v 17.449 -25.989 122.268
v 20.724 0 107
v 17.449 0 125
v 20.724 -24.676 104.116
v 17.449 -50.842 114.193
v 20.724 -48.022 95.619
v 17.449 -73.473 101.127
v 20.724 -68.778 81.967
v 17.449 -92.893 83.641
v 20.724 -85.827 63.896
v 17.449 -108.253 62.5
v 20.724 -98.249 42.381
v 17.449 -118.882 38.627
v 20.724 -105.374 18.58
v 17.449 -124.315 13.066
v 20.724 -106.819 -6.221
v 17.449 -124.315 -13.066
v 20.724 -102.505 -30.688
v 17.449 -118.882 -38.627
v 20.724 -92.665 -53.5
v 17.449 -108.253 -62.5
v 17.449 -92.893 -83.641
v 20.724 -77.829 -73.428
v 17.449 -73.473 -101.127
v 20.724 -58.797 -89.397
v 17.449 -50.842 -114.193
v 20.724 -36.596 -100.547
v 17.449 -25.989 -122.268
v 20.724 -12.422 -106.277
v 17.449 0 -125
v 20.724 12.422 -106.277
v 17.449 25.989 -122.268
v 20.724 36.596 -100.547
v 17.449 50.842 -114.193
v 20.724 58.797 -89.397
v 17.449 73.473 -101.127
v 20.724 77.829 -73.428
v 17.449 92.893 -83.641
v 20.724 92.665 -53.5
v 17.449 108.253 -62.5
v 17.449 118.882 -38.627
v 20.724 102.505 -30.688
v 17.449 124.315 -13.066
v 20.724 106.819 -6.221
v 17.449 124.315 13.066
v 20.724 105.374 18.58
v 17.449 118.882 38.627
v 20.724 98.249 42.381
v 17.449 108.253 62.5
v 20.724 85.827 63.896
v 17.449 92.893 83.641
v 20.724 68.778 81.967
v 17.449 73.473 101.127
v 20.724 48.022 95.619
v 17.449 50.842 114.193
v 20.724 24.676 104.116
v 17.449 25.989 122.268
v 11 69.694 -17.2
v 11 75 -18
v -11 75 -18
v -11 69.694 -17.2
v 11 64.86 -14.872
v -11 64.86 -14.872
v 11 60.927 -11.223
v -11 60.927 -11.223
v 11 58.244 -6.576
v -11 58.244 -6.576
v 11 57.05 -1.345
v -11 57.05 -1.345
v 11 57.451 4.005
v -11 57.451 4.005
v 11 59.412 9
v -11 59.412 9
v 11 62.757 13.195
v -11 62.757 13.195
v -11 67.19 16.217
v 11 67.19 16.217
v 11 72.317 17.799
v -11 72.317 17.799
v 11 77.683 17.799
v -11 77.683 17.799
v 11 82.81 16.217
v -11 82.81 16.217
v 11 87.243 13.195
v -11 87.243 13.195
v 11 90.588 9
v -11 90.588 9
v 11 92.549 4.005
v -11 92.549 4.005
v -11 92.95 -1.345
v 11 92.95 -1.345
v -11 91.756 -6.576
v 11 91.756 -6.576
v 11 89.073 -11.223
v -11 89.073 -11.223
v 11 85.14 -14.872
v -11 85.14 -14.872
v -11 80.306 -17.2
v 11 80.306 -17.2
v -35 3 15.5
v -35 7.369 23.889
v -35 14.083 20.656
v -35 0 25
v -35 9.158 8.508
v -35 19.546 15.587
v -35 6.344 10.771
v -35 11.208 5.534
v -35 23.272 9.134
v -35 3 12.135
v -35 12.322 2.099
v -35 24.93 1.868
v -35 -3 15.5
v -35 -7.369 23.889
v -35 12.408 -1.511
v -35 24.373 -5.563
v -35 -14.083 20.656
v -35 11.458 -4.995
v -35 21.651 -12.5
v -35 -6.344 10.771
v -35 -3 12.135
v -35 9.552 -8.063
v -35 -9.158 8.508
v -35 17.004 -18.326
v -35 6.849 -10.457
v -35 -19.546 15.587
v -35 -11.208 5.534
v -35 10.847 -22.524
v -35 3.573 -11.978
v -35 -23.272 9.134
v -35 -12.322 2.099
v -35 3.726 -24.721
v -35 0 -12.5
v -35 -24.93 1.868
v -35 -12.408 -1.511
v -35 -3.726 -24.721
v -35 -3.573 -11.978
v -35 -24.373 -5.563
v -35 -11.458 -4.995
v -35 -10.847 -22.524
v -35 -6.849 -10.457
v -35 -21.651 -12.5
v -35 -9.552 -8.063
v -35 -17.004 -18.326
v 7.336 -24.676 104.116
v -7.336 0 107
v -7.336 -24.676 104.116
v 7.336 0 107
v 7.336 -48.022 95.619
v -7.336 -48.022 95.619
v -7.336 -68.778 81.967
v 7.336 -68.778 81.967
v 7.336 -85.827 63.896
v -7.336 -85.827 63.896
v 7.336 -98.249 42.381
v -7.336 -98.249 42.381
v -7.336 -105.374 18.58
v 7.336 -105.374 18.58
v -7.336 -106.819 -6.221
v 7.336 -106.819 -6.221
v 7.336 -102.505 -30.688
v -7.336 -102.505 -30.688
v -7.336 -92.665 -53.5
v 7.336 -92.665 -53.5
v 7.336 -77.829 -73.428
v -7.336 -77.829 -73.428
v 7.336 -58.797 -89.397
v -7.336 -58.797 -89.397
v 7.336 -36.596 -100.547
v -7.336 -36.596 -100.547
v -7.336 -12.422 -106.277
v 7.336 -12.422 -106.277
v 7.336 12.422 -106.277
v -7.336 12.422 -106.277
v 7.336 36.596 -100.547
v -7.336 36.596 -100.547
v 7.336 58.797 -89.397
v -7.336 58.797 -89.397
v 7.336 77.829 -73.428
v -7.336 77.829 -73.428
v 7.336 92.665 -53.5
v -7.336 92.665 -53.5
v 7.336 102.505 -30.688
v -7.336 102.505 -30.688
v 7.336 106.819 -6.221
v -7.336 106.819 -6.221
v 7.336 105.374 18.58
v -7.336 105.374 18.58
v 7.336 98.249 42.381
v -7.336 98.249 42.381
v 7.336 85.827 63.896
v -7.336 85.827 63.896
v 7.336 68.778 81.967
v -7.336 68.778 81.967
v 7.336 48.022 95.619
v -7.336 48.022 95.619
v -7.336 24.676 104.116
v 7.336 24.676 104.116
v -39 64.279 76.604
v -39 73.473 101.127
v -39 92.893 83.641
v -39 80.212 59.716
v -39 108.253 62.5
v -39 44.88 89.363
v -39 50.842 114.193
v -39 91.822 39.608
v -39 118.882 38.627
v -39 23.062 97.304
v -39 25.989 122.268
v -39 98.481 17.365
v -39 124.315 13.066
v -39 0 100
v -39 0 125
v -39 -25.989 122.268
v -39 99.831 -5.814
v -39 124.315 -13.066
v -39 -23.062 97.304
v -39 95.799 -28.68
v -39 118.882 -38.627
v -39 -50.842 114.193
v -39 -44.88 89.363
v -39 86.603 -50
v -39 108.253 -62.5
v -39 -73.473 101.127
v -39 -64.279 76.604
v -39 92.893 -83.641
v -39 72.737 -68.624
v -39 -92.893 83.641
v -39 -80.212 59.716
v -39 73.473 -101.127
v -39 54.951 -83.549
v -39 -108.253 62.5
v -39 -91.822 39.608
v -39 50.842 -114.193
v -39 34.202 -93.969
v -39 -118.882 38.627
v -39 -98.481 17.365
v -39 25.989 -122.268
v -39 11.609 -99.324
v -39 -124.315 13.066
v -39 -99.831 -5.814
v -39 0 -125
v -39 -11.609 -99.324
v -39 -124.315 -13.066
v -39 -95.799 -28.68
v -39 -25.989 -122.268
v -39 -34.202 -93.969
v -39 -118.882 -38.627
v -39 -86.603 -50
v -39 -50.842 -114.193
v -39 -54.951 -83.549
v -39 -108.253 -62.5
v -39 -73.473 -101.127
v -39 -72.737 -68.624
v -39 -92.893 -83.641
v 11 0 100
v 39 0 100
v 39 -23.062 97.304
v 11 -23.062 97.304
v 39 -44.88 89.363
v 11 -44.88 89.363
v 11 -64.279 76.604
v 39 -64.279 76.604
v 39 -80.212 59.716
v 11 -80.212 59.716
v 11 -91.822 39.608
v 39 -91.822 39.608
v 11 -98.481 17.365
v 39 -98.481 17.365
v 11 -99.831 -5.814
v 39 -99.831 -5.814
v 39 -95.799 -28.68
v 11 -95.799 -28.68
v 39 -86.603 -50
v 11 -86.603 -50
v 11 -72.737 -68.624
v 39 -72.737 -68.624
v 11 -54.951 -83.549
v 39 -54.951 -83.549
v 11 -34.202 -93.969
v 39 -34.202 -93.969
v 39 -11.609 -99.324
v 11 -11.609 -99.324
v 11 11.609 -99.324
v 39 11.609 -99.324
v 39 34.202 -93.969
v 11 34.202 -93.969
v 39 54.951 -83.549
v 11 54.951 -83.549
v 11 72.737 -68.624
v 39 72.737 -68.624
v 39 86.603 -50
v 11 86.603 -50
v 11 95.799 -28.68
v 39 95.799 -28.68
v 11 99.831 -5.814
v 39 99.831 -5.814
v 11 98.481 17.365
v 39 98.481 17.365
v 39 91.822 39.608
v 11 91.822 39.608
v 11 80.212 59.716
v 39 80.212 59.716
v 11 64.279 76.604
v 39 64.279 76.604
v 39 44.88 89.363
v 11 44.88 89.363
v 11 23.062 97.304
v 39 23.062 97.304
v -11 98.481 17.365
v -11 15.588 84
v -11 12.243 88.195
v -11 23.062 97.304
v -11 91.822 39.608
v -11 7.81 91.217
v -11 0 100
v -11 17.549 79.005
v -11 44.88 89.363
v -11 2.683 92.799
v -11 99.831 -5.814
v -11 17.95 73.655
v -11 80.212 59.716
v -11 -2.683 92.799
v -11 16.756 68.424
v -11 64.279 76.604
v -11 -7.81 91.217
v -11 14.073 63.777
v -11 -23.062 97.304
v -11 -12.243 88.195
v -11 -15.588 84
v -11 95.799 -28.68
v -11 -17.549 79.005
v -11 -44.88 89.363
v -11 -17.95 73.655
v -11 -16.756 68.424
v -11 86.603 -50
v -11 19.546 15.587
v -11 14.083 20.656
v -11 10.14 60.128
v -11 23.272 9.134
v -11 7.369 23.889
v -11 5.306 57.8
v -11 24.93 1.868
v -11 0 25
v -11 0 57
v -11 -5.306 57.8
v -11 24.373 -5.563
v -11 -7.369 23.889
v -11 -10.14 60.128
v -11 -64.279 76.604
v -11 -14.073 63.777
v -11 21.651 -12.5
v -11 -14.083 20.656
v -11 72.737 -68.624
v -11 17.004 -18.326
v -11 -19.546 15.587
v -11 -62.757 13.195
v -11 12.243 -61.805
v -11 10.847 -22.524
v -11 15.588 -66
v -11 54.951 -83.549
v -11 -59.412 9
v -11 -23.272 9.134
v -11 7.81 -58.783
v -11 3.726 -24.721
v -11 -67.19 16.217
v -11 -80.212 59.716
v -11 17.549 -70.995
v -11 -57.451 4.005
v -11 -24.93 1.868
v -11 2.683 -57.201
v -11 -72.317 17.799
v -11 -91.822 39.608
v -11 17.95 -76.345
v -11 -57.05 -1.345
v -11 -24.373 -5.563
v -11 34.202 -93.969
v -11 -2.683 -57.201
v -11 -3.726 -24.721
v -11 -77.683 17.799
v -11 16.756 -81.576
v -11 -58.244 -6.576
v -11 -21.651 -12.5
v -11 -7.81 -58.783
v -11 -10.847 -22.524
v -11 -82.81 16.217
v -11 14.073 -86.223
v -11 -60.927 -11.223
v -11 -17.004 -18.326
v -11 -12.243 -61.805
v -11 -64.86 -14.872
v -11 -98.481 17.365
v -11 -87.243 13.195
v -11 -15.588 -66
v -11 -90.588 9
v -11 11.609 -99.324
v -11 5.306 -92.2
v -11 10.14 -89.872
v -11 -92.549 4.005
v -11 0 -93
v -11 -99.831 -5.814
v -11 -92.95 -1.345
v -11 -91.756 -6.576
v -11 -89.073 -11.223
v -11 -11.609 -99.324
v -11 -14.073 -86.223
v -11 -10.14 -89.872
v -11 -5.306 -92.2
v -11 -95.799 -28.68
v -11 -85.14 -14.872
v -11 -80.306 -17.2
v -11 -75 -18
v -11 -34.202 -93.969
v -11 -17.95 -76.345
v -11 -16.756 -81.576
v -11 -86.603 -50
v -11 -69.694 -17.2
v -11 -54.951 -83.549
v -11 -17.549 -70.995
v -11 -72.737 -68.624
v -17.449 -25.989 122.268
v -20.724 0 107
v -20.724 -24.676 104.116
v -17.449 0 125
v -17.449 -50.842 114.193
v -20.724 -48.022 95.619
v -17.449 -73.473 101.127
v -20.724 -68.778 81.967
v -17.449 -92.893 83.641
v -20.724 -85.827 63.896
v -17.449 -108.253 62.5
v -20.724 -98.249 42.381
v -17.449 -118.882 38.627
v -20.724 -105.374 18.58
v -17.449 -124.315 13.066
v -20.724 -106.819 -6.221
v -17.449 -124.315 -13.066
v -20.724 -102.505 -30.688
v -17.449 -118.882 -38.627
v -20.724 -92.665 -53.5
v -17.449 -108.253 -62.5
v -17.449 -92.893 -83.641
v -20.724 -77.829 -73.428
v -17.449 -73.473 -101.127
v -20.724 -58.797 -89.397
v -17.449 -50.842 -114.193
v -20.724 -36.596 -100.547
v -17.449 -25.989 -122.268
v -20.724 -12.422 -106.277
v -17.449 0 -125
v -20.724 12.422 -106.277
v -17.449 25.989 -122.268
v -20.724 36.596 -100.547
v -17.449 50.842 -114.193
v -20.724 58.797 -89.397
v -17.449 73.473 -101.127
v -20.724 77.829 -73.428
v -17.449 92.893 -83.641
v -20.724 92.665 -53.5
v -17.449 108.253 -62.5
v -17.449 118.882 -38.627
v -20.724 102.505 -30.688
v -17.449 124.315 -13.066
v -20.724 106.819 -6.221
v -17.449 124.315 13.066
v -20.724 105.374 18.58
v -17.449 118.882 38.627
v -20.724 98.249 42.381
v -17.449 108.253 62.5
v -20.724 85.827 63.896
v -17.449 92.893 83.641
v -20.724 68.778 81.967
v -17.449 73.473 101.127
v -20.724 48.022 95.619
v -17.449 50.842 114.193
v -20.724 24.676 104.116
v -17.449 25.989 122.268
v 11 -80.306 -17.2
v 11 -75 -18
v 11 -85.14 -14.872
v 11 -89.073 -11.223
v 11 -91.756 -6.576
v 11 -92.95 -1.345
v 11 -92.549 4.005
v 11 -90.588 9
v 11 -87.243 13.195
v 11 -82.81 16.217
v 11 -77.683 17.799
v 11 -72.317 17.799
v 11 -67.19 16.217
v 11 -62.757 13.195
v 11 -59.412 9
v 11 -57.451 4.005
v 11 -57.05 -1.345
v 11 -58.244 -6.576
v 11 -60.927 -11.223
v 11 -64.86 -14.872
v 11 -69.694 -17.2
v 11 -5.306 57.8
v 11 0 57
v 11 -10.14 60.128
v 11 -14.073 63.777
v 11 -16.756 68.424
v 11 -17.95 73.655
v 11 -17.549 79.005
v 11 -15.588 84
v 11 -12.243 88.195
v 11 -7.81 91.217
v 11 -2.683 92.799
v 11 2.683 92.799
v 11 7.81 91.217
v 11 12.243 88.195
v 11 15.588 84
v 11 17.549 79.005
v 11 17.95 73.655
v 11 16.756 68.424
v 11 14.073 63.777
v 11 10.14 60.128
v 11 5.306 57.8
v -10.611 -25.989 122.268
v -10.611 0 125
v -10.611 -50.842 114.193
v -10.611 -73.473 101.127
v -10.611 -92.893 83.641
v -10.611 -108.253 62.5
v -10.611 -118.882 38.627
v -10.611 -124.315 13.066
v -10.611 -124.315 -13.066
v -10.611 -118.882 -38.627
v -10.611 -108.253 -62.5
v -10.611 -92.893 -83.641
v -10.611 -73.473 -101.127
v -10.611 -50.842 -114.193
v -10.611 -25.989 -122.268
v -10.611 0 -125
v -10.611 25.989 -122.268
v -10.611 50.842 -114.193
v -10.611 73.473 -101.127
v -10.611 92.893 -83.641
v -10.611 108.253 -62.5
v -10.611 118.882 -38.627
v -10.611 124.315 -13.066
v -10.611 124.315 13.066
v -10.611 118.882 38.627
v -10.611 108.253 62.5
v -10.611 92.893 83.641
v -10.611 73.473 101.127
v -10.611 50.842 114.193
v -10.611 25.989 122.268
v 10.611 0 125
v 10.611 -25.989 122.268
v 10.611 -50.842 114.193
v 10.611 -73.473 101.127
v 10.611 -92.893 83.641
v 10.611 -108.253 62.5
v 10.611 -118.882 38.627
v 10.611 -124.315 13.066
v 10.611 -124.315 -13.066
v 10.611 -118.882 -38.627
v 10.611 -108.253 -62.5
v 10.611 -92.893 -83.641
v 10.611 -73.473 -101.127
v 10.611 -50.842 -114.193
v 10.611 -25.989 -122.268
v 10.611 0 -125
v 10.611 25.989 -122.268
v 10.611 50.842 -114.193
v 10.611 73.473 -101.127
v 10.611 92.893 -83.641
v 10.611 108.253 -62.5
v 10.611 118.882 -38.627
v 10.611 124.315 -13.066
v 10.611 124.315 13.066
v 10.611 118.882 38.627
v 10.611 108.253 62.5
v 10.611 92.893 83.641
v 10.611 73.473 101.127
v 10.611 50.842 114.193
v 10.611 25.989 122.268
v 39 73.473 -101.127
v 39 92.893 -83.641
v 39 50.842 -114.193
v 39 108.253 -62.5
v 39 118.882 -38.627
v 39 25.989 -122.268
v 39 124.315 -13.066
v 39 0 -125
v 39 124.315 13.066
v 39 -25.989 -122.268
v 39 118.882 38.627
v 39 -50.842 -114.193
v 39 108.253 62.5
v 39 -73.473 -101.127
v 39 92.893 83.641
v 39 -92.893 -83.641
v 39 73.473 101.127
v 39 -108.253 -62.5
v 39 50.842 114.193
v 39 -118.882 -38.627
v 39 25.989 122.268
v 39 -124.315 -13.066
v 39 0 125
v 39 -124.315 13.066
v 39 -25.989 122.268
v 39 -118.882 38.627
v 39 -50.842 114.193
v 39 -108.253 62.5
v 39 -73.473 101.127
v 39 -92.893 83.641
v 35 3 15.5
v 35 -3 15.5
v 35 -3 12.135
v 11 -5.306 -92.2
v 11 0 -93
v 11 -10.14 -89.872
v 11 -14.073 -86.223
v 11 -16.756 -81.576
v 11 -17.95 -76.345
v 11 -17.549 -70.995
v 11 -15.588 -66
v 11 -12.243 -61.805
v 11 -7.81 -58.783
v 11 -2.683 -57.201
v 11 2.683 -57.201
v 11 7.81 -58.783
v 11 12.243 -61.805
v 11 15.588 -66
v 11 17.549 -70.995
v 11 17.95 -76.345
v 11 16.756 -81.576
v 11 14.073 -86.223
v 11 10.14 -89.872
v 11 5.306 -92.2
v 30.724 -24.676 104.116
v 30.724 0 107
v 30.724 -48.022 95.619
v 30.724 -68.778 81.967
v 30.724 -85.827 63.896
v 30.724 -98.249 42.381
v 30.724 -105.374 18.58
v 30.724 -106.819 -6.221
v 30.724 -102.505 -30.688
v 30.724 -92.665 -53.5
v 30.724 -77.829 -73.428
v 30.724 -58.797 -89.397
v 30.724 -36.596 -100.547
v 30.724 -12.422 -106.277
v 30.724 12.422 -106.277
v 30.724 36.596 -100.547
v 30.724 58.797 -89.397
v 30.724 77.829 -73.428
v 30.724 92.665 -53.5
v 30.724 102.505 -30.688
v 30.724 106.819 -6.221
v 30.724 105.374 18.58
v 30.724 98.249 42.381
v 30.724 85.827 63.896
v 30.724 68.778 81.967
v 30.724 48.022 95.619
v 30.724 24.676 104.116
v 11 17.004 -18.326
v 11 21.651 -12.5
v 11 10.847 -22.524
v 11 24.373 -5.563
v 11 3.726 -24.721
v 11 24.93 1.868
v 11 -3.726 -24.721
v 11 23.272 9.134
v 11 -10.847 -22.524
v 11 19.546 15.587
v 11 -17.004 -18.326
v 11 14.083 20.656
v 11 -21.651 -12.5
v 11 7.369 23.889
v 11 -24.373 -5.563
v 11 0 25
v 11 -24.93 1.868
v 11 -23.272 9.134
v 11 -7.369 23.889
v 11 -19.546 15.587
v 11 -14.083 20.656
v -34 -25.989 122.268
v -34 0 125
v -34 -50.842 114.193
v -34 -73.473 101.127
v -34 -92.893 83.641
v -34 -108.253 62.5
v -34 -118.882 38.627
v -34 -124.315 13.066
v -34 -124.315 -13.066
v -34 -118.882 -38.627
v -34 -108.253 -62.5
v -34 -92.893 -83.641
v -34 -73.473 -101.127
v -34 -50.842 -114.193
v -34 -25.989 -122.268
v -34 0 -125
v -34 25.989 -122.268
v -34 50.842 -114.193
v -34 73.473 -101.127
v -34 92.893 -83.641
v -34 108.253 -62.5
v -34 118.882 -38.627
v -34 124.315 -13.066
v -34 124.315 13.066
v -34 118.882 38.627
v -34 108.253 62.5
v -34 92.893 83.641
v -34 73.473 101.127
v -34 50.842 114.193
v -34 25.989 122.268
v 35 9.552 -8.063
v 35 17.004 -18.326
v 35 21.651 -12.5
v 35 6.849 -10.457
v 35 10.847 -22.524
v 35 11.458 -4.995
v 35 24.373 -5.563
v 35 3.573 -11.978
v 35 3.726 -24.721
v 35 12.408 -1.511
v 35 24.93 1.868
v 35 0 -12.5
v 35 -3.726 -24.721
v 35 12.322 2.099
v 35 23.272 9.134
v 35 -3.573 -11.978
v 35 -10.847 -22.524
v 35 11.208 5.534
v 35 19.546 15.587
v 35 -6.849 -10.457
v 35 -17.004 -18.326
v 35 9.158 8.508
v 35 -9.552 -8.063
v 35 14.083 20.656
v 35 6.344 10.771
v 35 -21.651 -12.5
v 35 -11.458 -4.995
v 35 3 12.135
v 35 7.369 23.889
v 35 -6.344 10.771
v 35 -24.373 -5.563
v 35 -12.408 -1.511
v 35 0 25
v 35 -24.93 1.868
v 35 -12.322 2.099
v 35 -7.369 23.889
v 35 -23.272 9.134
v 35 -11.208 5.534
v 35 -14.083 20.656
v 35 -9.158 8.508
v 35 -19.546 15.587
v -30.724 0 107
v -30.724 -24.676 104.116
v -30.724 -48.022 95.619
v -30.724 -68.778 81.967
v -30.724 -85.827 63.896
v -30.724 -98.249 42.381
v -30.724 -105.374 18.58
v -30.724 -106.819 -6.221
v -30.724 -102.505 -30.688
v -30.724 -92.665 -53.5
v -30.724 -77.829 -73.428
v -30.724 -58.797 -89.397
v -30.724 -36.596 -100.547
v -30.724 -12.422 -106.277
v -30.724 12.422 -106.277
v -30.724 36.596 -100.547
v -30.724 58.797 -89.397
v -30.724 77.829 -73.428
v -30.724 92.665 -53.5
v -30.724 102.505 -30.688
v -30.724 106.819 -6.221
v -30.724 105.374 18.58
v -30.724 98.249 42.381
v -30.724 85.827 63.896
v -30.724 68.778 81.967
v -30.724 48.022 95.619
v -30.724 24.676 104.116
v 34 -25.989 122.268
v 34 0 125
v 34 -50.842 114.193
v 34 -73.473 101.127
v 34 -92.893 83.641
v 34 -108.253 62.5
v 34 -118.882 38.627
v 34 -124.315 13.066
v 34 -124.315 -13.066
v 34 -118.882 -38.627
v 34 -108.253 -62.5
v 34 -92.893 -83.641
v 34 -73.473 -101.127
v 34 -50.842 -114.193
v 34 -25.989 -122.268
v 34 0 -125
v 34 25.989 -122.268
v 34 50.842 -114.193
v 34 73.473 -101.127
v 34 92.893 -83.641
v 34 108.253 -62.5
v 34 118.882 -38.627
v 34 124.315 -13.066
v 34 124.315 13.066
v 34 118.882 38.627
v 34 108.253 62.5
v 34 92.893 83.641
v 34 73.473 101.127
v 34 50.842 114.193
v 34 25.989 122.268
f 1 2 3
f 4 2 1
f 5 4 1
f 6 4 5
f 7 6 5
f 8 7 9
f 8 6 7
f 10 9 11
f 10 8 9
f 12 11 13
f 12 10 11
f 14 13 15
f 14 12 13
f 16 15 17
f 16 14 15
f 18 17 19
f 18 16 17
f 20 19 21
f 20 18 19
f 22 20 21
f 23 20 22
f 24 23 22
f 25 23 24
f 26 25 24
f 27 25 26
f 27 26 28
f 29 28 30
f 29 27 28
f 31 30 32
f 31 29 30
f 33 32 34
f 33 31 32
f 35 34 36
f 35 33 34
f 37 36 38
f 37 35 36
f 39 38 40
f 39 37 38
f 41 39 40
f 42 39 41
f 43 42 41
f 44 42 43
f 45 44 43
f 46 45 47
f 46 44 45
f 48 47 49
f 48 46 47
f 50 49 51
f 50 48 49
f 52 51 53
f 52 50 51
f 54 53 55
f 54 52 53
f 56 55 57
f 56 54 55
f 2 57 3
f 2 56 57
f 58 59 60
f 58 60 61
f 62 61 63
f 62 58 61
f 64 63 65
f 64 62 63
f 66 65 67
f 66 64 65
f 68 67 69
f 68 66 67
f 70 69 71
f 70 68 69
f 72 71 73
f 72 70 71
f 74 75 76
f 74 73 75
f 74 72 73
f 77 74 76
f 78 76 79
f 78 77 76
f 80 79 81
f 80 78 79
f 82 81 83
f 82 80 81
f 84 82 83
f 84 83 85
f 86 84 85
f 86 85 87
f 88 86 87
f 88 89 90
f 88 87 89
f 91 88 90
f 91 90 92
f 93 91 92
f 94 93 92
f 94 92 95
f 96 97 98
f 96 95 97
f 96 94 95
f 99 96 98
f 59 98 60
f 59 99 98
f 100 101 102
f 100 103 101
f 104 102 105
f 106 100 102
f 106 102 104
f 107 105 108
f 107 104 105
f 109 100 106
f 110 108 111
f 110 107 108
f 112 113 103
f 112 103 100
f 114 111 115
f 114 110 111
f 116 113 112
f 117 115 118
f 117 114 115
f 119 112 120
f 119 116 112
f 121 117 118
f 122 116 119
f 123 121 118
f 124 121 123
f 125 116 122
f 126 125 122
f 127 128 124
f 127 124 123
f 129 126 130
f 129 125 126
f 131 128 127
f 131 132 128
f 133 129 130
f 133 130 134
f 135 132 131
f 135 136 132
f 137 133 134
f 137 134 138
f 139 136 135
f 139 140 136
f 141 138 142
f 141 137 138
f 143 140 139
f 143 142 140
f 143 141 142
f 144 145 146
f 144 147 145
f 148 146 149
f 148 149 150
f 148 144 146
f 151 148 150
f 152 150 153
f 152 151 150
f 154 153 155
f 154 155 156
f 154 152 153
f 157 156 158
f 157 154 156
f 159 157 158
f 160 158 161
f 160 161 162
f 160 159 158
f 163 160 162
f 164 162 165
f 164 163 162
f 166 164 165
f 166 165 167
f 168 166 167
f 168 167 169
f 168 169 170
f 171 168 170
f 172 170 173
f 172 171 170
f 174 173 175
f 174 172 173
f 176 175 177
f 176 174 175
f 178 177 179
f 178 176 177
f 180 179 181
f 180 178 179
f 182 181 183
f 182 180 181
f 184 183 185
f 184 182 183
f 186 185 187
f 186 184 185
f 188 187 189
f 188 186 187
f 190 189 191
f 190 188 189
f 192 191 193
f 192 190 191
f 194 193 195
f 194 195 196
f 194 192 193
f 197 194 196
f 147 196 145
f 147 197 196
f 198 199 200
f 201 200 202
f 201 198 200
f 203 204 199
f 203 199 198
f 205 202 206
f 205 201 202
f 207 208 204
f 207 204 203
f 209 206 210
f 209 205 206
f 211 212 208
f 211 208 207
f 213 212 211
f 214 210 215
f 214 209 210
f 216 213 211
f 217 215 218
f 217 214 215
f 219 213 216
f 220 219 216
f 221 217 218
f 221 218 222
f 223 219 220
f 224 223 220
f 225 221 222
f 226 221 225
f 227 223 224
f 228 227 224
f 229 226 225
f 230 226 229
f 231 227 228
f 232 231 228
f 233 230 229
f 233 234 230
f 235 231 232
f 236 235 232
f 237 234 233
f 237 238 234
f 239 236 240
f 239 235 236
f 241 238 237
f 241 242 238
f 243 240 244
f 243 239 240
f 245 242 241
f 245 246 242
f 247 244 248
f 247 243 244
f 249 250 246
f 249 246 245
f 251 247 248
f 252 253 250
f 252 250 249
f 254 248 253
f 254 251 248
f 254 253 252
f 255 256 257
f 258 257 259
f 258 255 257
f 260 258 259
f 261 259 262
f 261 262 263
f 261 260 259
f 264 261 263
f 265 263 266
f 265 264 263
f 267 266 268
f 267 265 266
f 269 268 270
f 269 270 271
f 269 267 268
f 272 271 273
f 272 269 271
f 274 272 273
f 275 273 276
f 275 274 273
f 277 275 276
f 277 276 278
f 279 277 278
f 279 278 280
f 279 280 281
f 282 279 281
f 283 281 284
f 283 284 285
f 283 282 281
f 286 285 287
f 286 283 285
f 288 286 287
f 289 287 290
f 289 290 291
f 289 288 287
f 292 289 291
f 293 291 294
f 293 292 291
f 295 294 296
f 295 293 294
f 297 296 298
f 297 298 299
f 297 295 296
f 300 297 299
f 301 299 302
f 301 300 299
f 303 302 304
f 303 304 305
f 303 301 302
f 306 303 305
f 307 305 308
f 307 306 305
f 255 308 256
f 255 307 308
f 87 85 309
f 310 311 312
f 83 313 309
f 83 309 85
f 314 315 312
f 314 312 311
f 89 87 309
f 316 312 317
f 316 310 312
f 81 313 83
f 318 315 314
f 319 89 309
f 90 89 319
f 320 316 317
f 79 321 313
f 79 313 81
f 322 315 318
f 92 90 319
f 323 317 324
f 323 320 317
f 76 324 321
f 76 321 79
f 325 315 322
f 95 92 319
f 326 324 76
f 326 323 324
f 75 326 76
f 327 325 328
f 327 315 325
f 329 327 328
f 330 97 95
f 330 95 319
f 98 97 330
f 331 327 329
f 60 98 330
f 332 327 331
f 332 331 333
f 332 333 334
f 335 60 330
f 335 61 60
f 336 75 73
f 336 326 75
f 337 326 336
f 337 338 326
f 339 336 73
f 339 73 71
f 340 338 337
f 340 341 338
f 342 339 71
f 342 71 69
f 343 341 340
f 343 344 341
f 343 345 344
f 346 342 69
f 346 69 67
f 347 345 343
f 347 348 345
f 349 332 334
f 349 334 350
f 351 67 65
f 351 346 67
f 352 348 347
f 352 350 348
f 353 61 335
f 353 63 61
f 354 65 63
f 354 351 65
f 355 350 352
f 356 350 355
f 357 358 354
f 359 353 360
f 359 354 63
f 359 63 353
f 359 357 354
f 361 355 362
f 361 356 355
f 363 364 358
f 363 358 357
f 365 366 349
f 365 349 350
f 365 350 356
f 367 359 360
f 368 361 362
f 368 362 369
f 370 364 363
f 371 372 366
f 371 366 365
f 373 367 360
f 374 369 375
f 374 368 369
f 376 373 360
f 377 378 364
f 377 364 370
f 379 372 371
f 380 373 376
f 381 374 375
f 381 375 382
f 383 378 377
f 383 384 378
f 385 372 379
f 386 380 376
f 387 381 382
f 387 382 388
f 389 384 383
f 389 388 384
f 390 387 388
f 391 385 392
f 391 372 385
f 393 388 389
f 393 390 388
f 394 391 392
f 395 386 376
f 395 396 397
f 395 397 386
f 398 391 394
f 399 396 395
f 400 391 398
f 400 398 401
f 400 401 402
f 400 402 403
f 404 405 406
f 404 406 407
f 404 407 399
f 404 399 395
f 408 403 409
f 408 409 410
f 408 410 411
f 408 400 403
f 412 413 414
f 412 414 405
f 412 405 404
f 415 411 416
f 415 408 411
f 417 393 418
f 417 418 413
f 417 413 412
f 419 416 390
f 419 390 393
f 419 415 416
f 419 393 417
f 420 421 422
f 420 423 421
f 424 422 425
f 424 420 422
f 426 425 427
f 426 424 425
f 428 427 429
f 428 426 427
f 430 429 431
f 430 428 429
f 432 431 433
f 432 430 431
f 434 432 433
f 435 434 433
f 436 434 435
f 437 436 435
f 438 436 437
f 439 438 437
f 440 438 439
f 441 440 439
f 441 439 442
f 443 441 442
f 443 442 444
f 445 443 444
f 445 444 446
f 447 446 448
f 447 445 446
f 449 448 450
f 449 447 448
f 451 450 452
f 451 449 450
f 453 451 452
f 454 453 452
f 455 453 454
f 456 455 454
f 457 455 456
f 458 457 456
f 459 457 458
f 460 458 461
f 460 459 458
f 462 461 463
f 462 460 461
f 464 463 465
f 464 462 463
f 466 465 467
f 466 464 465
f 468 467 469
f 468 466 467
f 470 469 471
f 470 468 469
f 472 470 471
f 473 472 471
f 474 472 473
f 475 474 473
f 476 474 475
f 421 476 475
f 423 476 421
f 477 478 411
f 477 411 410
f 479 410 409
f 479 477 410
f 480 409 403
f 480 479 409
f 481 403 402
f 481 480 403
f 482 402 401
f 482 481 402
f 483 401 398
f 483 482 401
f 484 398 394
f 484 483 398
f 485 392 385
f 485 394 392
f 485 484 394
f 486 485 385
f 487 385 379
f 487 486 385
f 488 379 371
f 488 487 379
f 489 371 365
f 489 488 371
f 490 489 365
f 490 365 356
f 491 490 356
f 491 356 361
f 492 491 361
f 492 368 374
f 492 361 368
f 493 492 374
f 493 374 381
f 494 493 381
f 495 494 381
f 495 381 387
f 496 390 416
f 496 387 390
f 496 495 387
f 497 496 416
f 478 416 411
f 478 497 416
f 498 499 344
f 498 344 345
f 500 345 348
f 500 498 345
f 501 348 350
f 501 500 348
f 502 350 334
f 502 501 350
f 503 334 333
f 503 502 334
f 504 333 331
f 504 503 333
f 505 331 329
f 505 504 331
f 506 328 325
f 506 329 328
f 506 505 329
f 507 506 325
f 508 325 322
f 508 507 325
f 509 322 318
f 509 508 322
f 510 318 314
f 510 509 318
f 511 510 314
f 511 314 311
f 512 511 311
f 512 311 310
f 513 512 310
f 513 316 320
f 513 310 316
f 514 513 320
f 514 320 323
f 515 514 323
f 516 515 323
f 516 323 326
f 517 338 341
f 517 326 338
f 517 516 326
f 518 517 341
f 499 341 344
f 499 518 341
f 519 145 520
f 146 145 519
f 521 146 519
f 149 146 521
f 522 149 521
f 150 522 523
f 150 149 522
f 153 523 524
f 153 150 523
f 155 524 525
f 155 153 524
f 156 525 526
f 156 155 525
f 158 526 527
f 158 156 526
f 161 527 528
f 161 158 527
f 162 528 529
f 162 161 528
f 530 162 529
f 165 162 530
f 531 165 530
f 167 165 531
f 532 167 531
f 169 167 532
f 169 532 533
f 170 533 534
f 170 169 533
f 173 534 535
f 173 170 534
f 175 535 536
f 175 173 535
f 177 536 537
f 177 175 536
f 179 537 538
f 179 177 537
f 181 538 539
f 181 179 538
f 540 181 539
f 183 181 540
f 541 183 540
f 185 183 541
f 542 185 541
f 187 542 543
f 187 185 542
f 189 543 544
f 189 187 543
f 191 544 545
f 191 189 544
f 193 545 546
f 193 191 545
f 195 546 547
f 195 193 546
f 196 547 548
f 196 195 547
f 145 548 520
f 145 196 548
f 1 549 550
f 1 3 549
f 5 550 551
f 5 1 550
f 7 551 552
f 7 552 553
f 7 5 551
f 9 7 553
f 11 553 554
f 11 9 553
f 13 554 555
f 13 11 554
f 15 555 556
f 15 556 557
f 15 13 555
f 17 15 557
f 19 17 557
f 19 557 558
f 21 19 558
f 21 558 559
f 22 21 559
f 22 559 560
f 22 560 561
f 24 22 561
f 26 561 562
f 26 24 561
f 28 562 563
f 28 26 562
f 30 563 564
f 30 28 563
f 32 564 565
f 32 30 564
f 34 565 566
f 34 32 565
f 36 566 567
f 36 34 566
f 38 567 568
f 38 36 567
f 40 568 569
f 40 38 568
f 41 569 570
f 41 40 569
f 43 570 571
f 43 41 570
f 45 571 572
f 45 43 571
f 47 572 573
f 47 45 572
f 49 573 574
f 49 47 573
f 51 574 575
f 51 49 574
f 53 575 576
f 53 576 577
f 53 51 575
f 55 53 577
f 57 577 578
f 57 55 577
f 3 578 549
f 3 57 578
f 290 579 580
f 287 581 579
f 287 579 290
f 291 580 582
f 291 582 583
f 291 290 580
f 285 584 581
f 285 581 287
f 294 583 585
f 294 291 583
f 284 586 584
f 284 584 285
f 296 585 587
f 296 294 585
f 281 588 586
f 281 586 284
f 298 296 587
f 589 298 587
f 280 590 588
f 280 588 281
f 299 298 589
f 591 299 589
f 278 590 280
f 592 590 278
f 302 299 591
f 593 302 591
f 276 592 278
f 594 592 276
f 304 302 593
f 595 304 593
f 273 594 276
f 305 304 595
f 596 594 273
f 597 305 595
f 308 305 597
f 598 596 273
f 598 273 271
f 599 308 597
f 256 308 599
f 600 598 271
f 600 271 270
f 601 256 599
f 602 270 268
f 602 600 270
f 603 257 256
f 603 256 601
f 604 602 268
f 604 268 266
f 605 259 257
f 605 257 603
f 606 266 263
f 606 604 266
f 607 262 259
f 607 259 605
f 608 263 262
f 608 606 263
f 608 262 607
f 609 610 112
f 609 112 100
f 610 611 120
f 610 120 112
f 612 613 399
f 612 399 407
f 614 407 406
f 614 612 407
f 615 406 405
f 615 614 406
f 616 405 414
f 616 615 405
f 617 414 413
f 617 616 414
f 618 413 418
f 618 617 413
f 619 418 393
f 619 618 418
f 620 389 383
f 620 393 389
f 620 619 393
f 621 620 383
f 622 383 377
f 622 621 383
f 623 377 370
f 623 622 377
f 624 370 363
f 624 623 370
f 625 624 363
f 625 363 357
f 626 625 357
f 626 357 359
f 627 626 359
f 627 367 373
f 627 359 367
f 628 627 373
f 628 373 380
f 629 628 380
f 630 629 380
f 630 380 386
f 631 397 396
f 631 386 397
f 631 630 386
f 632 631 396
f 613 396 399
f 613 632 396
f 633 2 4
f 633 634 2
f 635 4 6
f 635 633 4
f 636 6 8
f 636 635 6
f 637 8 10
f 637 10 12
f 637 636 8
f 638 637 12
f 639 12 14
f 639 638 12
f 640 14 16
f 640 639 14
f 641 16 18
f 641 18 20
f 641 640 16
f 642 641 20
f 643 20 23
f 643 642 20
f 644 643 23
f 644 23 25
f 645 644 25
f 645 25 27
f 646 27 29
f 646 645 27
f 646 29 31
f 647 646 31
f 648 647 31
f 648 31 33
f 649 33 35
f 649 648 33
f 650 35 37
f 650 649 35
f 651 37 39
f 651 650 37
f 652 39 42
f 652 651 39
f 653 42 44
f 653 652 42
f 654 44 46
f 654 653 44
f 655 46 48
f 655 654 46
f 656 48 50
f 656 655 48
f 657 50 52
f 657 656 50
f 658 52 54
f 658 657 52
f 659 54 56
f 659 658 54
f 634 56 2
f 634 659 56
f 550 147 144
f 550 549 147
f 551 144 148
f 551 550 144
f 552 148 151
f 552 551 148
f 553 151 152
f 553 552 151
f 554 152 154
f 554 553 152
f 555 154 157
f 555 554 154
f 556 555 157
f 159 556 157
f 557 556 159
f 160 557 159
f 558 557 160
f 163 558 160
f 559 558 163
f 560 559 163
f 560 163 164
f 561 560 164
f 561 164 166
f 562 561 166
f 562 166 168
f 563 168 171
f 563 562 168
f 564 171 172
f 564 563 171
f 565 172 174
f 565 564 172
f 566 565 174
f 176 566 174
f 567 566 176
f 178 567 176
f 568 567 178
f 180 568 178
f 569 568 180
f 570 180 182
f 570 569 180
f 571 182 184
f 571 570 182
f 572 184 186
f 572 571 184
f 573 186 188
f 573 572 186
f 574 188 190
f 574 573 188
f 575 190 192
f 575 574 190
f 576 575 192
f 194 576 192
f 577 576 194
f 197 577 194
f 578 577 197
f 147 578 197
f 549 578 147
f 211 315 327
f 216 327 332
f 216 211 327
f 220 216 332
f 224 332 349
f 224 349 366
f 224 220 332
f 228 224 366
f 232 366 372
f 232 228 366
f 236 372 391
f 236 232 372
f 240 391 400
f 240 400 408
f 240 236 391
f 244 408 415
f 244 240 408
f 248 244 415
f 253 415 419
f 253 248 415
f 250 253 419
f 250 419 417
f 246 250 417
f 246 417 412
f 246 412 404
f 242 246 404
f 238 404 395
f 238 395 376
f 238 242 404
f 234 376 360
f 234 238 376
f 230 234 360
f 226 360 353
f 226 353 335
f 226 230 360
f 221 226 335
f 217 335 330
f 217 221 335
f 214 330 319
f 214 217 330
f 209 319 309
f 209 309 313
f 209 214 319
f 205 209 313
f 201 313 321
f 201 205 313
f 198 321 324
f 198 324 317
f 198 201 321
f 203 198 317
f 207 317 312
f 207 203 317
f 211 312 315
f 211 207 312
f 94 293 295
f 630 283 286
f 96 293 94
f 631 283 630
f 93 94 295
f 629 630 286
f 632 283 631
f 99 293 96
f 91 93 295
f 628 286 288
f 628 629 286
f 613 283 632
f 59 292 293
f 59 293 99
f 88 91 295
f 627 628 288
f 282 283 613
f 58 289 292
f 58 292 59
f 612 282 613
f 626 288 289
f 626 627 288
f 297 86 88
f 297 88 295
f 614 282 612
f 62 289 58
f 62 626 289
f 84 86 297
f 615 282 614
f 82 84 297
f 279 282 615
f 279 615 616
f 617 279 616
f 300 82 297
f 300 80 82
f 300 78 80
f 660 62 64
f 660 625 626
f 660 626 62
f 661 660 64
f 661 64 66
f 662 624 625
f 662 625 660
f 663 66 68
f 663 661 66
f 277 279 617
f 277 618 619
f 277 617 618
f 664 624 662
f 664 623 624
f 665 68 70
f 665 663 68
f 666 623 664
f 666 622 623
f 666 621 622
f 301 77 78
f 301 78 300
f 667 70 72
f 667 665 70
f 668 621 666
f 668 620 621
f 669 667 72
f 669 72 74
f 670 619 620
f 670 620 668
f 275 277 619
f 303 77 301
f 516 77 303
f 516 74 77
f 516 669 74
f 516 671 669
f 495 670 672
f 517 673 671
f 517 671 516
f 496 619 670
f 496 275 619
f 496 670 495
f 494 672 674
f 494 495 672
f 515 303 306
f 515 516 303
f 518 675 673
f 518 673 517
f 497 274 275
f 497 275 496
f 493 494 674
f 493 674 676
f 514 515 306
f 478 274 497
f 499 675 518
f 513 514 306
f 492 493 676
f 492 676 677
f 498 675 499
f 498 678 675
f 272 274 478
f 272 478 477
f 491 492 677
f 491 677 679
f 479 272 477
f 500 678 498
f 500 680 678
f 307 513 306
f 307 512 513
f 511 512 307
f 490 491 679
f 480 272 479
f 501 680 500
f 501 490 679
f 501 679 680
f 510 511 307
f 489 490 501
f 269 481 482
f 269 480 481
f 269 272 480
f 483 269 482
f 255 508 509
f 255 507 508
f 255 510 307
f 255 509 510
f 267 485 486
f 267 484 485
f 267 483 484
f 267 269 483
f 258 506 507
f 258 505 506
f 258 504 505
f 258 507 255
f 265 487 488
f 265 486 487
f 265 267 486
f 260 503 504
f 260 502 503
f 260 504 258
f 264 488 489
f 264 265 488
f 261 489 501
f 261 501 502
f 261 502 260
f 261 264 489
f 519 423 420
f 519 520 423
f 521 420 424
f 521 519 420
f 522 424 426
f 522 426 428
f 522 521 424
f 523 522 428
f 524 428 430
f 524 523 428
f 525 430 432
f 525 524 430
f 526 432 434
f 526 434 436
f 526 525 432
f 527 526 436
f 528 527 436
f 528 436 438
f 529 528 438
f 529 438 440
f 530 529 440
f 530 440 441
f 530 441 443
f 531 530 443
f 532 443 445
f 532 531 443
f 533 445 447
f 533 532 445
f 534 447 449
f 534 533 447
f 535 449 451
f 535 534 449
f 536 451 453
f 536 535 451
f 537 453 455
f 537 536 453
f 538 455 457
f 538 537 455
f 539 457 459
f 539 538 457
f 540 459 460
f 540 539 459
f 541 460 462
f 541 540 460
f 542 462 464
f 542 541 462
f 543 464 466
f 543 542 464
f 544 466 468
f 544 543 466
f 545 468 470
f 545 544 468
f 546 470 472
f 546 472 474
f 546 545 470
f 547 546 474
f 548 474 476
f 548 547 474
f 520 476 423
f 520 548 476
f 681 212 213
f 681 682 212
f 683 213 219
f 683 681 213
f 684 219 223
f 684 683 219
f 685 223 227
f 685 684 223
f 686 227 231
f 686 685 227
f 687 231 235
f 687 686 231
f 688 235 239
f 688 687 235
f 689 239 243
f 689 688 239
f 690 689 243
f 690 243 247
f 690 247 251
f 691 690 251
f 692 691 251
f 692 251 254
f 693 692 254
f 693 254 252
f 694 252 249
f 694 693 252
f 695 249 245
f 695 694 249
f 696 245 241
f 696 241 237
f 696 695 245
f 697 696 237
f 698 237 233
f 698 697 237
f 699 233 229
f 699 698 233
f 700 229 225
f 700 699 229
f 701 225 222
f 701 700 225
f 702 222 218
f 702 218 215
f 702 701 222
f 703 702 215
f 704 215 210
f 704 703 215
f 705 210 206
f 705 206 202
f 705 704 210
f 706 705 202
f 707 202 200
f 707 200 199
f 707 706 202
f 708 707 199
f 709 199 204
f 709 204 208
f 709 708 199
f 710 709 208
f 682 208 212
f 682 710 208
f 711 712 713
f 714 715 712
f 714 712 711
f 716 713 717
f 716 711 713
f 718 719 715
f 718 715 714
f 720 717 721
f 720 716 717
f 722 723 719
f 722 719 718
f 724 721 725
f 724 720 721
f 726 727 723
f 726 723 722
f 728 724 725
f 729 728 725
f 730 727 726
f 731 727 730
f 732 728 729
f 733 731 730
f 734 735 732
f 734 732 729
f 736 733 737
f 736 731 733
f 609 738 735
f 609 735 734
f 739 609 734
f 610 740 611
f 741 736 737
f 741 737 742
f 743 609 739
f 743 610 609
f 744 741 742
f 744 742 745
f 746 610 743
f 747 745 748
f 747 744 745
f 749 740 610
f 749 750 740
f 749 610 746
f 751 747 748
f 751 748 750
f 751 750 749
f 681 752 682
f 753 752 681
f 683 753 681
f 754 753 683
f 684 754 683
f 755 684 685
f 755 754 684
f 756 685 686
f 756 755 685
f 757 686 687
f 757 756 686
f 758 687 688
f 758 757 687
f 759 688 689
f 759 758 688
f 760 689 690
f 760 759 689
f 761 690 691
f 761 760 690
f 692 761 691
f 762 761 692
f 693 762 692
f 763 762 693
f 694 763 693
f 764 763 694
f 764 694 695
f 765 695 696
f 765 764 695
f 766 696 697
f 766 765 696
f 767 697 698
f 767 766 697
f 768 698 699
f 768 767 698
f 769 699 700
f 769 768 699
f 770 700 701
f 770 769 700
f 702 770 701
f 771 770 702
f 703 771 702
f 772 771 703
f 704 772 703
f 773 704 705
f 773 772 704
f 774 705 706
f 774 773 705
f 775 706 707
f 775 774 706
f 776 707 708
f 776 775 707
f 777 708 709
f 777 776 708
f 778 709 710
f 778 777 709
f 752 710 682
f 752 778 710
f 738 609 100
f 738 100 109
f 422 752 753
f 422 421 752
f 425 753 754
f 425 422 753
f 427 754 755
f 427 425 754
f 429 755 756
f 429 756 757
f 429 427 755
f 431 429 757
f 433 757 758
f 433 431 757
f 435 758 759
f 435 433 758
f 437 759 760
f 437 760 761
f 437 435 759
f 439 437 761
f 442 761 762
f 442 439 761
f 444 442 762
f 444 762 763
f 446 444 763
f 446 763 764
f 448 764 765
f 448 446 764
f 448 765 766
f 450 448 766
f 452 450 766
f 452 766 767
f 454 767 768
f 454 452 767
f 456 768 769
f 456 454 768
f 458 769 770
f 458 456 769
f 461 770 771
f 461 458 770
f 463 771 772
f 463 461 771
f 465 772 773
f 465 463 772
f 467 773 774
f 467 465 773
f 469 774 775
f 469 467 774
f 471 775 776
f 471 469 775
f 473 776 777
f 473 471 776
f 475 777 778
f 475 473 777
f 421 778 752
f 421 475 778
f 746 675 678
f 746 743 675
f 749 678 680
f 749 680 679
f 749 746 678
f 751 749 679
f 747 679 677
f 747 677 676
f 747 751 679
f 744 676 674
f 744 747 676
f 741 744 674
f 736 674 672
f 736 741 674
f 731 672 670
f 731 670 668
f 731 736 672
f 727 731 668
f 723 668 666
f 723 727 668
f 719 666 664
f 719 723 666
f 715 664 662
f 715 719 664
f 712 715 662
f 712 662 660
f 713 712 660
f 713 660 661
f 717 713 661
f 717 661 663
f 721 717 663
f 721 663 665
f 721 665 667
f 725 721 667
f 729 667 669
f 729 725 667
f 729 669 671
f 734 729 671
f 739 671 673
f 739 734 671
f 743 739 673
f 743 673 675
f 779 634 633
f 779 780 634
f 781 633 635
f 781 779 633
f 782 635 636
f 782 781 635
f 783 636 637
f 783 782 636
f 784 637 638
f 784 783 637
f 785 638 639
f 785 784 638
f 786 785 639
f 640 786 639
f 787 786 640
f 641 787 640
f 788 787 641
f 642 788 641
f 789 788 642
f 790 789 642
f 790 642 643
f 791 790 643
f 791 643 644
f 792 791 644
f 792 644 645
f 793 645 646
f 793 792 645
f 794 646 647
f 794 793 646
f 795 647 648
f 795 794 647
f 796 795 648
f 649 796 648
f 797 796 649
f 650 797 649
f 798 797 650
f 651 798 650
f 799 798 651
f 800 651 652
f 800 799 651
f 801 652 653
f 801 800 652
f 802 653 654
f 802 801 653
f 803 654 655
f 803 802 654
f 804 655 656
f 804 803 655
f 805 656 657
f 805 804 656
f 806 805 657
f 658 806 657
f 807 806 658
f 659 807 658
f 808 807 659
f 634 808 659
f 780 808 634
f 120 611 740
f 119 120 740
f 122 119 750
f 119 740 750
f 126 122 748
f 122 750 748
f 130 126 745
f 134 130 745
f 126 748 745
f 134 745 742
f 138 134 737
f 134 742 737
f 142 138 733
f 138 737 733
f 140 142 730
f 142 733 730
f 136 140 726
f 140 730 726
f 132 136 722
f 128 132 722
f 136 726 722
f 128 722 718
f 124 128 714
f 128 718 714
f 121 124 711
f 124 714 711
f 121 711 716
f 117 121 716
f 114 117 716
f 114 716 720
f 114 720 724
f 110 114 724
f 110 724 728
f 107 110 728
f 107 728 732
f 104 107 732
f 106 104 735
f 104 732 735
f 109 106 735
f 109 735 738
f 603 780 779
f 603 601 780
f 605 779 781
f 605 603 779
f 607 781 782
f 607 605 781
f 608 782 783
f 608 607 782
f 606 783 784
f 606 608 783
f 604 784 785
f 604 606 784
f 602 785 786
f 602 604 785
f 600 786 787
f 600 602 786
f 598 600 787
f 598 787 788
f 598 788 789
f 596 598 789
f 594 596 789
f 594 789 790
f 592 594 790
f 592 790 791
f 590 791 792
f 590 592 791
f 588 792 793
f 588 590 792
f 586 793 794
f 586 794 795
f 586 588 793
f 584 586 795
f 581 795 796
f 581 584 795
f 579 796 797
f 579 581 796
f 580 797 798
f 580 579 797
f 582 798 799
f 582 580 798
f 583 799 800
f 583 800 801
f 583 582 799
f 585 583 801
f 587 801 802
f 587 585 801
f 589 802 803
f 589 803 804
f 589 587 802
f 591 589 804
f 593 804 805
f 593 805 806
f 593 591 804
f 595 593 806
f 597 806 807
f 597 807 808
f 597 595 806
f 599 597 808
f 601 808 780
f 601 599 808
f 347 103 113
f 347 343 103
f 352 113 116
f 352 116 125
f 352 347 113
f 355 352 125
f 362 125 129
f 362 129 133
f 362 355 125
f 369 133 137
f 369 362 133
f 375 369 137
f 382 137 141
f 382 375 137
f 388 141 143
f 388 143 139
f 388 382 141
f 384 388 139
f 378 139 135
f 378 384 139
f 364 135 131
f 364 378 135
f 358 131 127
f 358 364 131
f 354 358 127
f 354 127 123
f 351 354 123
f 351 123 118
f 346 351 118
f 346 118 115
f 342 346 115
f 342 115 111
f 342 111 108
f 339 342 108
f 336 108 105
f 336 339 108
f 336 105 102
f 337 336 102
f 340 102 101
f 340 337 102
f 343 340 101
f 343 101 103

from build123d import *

# Parameters (mm, degrees)
CUT_EXTRUDE1_DEPTH      = 184.711730709
CUT_EXTRUDE1_DEPTH_BACK = 184.711730709
SKETCH2_R               = 18


with BuildPart() as part:
    # Sketch1 → Revolve2 (revolve)
    with BuildSketch(Plane.XY, mode=Mode.PRIVATE) as revolve2_sk:
        Polygon((17.448535783, 125), (20.724267892, 107), (30.724267892, 107), (34, 125), (39, 125), (39, 100), (11, 100), (11, 25), (35, 25), (35, 12.5), (0, 12.5), (-35, 12.5), (-35, 25), (-11, 25), (-11, 100), (-39, 100), (-39, 125), (-34, 125), (-30.724267892, 107), (-20.724267892, 107), (-17.448535783, 125), (-10.611364858, 125), (-7.33563275, 107), (7.33563275, 107), (10.611364858, 125), align=None)
    revolve(revolve2_sk.sketch.rotate(Axis((-121.58529461, 0, 0), (1, 0, 0)), 90), axis=Axis((-121.58529461, 0, 0), (1, 0, 0)))

    # Sketch2 → Cut-Extrude1 (cut, two sides: drawn at the far end of the back side and taken through both)
    with BuildSketch(Plane.ZY.offset(11).offset(-CUT_EXTRUDE1_DEPTH_BACK)):
        with Locations(Location((0, 75, 0), (0, 0, 180))):
            Circle(SKETCH2_R)
        with Locations(Location((75, 0, 0), (0, 0, 180))):
            Circle(SKETCH2_R)
        with Locations(Location((0, -75, 0), (0, 0, 180))):
            Circle(SKETCH2_R)
        with Locations(Location((-75, 0, 0), (0, 0, 180))):
            Circle(SKETCH2_R)
        with BuildLine():
            Line((15.5, -3), (15.5, 3))
            Line((15.5, 3), (12.1346611, 3))
            ThreePointArc((12.1346611, 3), (-12.5, 0), (12.1346611, -3))
            Line((12.1346611, -3), (15.5, -3))
        make_face()
    extrude(amount=CUT_EXTRUDE1_DEPTH + CUT_EXTRUDE1_DEPTH_BACK, mode=Mode.SUBTRACT)


solid = part.part
